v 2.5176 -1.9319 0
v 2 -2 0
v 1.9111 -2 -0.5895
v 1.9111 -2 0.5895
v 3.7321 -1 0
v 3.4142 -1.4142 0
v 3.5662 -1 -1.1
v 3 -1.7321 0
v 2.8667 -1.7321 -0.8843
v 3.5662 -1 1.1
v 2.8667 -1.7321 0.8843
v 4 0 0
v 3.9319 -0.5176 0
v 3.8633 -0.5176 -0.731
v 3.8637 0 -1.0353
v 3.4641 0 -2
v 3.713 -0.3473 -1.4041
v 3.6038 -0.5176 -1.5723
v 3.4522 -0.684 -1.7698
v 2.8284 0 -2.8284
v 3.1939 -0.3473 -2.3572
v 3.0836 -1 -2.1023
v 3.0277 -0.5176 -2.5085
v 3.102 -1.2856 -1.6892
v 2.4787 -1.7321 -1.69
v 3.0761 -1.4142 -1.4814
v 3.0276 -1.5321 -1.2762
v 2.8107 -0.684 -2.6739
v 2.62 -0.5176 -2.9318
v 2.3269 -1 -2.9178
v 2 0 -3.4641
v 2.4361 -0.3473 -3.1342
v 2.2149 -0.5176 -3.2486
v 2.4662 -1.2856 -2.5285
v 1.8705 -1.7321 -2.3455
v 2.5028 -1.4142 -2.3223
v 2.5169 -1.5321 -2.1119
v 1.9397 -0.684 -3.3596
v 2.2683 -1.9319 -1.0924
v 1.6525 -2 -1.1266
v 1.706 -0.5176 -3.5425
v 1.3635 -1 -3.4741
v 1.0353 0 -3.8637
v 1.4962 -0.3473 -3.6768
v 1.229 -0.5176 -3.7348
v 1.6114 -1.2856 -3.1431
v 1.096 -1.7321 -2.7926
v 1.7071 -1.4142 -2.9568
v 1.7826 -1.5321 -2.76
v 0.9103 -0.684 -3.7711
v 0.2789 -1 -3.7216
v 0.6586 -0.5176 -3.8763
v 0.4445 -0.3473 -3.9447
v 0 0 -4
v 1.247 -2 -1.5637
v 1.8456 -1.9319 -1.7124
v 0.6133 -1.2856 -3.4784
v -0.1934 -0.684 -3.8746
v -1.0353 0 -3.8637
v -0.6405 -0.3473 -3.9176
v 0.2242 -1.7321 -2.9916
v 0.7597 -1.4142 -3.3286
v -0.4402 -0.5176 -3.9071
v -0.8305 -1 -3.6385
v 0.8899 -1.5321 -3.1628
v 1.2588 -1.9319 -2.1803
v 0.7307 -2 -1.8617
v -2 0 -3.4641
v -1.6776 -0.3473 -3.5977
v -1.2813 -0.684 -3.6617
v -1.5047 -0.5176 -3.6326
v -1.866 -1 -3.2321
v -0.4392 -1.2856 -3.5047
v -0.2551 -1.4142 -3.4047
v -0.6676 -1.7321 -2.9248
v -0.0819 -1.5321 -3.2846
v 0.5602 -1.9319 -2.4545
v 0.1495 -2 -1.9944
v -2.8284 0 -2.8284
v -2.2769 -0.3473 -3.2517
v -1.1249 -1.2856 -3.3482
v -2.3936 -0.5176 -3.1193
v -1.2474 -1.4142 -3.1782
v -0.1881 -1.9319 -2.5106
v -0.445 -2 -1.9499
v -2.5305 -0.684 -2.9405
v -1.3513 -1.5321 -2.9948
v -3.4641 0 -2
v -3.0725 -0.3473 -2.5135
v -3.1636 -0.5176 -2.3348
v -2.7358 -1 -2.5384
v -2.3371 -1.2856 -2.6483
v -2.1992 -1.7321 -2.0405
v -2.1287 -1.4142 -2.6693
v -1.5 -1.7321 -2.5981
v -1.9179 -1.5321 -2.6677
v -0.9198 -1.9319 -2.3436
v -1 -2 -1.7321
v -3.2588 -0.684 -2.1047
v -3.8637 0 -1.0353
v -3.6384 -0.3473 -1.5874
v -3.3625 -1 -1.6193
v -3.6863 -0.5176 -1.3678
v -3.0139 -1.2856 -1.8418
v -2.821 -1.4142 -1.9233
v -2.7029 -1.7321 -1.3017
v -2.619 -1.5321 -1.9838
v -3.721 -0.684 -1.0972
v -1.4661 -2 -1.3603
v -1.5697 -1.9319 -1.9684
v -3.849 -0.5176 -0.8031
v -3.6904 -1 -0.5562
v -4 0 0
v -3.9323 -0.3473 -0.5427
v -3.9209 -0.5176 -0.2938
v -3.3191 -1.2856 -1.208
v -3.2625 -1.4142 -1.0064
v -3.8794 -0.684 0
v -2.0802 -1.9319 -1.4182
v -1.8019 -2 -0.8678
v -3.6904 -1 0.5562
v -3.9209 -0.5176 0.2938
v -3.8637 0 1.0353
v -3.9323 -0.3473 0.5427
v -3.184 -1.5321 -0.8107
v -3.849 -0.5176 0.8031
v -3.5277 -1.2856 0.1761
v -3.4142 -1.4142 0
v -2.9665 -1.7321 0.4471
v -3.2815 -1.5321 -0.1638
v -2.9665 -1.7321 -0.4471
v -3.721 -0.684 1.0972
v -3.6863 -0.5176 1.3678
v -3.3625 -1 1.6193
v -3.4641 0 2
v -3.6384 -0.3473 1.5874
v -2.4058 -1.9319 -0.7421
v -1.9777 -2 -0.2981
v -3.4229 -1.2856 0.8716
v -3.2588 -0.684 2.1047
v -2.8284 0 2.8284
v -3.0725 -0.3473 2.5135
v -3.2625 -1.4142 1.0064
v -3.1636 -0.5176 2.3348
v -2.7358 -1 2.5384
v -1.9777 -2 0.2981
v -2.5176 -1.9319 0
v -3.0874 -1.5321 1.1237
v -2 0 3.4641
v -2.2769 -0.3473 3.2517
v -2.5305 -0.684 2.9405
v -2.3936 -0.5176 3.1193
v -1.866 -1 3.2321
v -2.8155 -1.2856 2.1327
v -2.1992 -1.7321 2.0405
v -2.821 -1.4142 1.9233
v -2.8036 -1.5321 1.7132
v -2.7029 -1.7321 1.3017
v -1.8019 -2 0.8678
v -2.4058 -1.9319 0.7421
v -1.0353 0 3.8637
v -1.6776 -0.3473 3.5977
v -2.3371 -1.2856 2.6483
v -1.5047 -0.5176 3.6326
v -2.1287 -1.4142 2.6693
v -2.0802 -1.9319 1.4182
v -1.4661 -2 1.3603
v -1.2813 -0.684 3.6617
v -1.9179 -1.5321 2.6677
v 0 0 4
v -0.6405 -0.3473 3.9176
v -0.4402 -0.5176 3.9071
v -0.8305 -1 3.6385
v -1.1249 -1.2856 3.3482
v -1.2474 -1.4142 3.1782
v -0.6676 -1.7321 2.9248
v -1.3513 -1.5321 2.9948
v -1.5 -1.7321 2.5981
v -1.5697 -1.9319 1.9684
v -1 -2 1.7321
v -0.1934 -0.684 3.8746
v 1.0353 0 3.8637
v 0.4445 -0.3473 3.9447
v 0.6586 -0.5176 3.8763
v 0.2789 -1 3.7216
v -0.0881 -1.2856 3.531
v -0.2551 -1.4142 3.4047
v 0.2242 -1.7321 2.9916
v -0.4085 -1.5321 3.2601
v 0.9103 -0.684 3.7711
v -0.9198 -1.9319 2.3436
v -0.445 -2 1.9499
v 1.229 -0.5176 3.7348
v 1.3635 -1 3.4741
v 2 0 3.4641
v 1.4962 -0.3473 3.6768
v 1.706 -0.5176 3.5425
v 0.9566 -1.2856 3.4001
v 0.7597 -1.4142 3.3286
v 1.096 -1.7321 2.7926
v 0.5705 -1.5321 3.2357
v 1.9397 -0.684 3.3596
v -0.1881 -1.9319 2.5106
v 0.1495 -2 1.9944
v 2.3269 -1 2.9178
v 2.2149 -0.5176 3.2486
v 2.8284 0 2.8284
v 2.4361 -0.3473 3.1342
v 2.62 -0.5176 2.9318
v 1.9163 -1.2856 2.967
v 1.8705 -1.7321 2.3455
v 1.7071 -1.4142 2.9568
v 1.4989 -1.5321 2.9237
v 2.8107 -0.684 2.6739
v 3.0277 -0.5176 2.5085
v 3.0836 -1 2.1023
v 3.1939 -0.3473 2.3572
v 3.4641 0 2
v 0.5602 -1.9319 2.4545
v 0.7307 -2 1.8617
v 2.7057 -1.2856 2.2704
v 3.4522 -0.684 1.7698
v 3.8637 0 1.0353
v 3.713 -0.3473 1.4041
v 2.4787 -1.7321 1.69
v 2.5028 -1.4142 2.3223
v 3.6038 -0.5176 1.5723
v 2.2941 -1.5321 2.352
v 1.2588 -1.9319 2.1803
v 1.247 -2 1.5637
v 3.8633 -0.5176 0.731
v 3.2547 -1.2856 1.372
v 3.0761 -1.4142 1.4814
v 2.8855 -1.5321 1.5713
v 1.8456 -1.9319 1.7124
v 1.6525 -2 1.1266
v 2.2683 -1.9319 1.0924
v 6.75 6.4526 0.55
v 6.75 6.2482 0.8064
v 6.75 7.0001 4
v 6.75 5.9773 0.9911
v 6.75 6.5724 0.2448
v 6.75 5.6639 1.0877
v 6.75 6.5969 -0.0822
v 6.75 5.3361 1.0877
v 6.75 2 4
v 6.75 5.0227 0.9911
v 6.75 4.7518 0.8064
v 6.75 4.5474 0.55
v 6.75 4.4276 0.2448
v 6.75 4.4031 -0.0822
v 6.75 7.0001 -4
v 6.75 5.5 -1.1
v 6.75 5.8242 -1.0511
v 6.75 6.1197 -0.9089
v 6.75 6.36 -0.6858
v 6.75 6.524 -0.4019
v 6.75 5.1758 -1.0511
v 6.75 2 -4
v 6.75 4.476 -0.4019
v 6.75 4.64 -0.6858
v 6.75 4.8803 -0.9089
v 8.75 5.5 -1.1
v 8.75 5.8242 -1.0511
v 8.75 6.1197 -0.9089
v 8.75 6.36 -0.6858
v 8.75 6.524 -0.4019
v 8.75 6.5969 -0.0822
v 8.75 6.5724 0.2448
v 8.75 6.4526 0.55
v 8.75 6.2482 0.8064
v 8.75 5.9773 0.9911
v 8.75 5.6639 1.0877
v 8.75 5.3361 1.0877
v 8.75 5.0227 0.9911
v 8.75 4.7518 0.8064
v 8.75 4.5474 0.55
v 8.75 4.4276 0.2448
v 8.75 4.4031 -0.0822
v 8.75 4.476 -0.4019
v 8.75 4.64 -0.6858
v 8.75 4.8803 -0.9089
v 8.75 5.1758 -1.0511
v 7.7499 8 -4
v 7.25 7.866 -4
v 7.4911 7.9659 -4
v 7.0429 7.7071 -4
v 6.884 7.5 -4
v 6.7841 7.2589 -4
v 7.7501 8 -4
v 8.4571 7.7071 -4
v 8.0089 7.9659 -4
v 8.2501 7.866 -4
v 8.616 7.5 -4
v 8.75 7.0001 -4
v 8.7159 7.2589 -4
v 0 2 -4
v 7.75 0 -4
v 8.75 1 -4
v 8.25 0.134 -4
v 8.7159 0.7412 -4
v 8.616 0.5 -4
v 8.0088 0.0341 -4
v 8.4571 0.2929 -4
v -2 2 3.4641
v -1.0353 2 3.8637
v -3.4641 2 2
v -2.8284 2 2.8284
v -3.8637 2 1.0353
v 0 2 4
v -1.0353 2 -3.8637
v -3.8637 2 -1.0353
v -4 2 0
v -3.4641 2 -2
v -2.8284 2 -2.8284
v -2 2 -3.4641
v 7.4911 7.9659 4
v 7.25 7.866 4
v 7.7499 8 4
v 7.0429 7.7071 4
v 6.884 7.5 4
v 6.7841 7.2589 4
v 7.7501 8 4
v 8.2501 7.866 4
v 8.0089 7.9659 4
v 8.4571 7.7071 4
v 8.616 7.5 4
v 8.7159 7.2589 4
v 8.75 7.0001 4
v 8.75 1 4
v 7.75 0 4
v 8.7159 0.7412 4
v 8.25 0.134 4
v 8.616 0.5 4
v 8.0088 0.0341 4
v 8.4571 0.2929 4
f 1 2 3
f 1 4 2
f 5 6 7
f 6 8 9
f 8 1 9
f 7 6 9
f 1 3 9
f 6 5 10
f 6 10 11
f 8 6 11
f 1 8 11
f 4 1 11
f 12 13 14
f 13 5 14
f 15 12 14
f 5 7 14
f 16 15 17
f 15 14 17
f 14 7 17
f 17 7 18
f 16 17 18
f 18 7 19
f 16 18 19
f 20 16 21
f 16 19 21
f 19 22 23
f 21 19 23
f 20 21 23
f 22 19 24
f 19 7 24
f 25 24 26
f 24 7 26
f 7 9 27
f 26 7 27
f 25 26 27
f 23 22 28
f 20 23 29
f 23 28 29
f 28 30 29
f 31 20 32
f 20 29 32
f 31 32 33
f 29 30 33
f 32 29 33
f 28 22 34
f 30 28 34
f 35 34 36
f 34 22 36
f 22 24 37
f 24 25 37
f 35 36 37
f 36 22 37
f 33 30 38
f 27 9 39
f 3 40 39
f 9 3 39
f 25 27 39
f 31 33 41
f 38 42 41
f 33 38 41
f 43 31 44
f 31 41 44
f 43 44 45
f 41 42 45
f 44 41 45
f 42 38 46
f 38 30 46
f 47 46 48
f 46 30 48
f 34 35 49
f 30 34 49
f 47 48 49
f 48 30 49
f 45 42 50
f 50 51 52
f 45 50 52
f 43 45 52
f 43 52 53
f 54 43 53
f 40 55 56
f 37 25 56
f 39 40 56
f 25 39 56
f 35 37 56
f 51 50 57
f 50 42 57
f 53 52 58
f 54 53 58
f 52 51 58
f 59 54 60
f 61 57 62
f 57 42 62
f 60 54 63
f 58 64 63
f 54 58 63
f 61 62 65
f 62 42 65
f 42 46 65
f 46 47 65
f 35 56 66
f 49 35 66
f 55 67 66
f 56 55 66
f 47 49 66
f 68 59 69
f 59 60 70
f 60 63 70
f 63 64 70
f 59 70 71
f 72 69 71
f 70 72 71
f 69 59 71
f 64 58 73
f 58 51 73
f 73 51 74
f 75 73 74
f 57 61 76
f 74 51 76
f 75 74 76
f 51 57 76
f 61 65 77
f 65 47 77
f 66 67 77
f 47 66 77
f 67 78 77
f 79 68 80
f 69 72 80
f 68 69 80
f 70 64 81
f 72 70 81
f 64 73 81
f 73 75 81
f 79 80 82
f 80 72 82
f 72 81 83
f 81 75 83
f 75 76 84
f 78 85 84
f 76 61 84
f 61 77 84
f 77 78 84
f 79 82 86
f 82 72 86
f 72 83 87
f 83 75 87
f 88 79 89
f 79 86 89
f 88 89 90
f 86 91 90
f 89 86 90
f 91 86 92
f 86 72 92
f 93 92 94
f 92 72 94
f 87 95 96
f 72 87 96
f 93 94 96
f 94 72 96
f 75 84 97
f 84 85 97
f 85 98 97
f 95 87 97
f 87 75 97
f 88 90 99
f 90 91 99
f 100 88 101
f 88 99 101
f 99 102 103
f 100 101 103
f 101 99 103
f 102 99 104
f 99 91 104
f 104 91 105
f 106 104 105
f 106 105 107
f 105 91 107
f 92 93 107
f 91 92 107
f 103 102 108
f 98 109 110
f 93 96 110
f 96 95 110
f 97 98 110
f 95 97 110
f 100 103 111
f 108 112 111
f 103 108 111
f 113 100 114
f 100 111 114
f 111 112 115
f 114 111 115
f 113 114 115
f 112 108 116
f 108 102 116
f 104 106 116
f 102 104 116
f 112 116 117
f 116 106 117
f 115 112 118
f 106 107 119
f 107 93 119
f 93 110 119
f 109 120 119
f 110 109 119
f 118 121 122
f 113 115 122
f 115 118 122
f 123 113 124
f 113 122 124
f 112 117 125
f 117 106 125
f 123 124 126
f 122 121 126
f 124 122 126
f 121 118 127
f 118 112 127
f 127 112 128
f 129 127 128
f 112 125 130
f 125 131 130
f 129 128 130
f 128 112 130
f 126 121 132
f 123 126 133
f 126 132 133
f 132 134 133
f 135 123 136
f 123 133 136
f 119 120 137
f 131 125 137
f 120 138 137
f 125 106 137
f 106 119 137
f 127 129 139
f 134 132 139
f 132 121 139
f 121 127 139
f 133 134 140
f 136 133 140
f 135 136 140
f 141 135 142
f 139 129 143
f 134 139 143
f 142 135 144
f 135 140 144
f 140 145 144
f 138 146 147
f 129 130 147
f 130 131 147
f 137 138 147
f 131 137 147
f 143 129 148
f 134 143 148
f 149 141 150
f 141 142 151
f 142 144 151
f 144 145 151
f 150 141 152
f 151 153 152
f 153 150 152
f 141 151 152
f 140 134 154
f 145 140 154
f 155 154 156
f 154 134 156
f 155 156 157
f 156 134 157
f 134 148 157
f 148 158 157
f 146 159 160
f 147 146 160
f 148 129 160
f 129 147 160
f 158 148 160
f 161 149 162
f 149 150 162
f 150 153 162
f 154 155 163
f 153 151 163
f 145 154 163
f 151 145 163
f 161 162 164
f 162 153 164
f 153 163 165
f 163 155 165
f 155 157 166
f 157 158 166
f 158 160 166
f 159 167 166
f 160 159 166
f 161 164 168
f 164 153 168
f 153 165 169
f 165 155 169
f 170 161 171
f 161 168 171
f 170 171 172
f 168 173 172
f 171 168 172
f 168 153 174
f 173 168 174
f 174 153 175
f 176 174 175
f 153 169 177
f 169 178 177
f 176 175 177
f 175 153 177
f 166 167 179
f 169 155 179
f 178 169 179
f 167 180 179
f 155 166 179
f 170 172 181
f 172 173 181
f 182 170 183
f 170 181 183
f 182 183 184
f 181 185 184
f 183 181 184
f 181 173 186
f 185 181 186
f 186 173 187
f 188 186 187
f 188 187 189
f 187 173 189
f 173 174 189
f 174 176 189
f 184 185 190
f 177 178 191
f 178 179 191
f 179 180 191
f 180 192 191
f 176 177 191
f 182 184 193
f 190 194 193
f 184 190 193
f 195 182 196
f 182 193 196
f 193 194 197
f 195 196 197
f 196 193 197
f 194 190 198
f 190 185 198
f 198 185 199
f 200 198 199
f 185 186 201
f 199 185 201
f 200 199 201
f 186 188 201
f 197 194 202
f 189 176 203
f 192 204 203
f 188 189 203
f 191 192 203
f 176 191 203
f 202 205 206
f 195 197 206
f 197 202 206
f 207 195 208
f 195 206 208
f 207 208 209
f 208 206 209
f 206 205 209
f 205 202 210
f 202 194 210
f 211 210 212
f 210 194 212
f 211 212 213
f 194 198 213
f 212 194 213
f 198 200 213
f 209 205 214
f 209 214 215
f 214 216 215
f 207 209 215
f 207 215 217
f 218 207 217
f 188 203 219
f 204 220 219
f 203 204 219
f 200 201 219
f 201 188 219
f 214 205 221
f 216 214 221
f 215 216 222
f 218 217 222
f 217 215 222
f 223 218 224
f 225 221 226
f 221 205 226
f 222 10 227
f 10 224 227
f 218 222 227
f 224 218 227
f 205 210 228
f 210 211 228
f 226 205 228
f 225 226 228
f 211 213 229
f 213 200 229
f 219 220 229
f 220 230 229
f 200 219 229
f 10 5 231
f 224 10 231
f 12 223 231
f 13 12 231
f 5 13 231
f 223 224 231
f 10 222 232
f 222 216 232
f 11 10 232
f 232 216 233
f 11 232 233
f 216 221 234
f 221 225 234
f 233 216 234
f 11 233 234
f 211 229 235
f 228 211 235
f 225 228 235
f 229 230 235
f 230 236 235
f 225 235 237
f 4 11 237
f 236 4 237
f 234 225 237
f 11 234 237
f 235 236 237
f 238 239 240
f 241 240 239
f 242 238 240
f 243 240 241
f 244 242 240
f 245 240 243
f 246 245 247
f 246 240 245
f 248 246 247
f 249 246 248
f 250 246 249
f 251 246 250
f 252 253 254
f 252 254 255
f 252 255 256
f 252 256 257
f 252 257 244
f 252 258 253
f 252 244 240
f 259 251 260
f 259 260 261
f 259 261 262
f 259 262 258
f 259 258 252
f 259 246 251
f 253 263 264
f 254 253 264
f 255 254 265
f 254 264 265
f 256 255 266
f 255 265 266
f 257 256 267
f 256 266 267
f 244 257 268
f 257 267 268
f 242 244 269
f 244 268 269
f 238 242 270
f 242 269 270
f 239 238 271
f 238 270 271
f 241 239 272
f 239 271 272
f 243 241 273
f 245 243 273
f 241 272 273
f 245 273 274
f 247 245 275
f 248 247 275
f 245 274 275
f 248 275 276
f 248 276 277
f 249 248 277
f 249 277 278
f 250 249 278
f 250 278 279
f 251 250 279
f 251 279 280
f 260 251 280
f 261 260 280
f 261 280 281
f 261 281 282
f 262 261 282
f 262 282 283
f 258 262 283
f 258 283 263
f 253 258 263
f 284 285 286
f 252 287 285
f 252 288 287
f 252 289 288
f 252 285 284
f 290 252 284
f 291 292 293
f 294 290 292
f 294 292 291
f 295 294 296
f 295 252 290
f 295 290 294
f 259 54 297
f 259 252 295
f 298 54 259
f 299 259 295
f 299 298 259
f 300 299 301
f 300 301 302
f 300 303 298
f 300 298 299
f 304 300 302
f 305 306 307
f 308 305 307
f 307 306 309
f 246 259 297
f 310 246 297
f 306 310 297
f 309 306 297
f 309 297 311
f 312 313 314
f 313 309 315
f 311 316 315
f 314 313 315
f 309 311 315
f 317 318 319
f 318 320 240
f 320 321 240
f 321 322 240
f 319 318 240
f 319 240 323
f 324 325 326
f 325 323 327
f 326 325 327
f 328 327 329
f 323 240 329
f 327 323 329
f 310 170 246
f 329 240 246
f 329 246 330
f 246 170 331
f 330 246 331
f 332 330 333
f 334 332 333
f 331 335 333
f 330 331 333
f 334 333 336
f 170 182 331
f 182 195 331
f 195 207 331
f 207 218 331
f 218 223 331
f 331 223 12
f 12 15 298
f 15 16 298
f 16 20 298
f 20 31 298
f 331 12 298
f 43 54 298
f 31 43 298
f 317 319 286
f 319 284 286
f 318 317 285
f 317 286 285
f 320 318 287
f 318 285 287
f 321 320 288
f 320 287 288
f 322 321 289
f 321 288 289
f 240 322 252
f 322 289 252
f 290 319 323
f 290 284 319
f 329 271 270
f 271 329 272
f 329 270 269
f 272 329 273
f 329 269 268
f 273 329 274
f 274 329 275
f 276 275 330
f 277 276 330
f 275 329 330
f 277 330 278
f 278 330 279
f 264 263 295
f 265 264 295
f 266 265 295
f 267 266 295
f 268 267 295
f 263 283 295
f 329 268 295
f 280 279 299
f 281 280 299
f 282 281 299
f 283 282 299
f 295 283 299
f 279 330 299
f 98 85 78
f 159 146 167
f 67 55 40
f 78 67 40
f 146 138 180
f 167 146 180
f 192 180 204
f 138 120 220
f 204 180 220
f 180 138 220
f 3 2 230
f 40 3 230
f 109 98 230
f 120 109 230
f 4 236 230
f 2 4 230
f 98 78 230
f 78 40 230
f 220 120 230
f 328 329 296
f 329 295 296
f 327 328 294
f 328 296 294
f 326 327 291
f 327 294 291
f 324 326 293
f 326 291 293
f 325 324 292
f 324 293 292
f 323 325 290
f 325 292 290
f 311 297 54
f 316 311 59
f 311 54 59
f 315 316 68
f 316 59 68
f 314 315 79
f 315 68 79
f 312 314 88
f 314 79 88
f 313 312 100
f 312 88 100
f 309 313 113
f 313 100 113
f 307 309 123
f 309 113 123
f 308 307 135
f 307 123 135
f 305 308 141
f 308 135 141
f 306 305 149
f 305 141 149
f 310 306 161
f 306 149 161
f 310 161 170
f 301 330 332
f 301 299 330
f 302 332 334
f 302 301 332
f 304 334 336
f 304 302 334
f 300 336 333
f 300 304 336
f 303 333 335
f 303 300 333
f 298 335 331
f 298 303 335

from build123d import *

# Parameters (mm, degrees)
SKETCH_1_R          = 2.525
EXTRUDE_1_DEPTH     = 2
EXTRUDE_START       = -2
SKETCH_2_R          = 2.525
EXTRUDE_2_DEPTH     = 2
SKETCH_3_R          = 4
EXTRUDE_3_DEPTH     = 2
EXTRUDE_6_DEPTH     = 8
SKETCH_11_R         = 1.05
CUT_EXTRUDE_1_DEPTH = 28.51931143
FILLET_3_R          = 1
SKETCH_12_W         = 8
SKETCH_12_H         = 5.5
CUT_EXTRUDE_2_DEPTH = 17
SKETCH_13_W         = 2
SKETCH_13_H         = 8
EXTRUDE_7_DEPTH     = 6
FILLET_4_R          = 1
FILLET_5_R          = 1
SKETCH_14_R         = 1.1
CUT_EXTRUDE_3_DEPTH = 10


with BuildPart() as part:
    # 草图1 → 凸台-拉伸1 (new body)
    with BuildSketch(Plane(origin=(0, 0, 0), x_dir=(1, 0, 0), z_dir=(0, 1, 0))):
        with BuildLine():
            Line((0, 4), (25.75, 4))
            Line((25.75, 4), (25.75, -4))
            Line((25.75, -4), (0, -4))
            ThreePointArc((0, -4), (-4, 0), (0, 4))
        make_face()
        with Locations(Location((0, 0, 0), (0, 0, 270))):
            Circle(SKETCH_1_R, mode=Mode.SUBTRACT)
    extrude(amount=EXTRUDE_1_DEPTH)

    # 草图2 → 凸台-拉伸2 (add)
    with BuildSketch(Plane(origin=(0, 2, 0), x_dir=(1, 0, 0), z_dir=(0, 1, 0)).offset(EXTRUDE_START)):
        Circle(SKETCH_2_R)
    extrude(amount=EXTRUDE_2_DEPTH)

    # 草图3 → 凸台-拉伸3 (add)
    with BuildSketch(Plane(origin=(0, 0, 0), x_dir=(1, 0, 0), z_dir=(0, 1, 0)).offset(EXTRUDE_START)):
        with Locations(Location((0, 0, 0), (0, 0, 270))):
            Circle(SKETCH_3_R)
    extrude(amount=EXTRUDE_3_DEPTH)

    # 圆角2: read off the stored shape, not the designer's step
    # 圆角2 outline → 圆角2 (revolve, cut)
    with BuildSketch(Plane.XY):
        with BuildLine():
            ThreePointArc((4, 0), (3.414213562, -1.414213562), (2, -2))
            Line((2, -2), (4, -2))
            Line((4, -2), (4, 0))
        make_face()
    revolve(axis=Axis((0, 0, 0), (0, 1, 0)), mode=Mode.SUBTRACT)

    # 草图10 → 凸台-拉伸6 (add)
    with BuildSketch(Plane(origin=(0, 0, -4), x_dir=(-1, 0, 0), z_dir=(0, 0, -1))):
        with BuildLine():
            Line((-25.75, 2), (-25.75, 4))
            ThreePointArc((-25.75, 4), (-24.25, 5.5), (-22.75, 4))
            Line((-22.75, 4), (-22.75, 2))
            Line((-22.75, 2), (-25.75, 2))
        make_face()
        with BuildLine():
            Line((-18.75, 2), (-15.75, 2))
            Line((-15.75, 2), (-15.75, 4))
            ThreePointArc((-15.75, 4), (-17.25, 5.5), (-18.75, 4))
            Line((-18.75, 4), (-18.75, 2))
        make_face()
    extrude(amount=-EXTRUDE_6_DEPTH)

    # 草图11 → 切除-拉伸1 (cut, through all)
    with BuildSketch(Plane(origin=(0, 0, -4), x_dir=(-1, 0, 0), z_dir=(0, 0, -1))):
        with Locations((-17.25, 4)):
            Circle(SKETCH_11_R)
        with Locations((-24.25, 4)):
            Circle(SKETCH_11_R)
    extrude(amount=-CUT_EXTRUDE_1_DEPTH, mode=Mode.SUBTRACT)

    # 圆角3
    fillet_3_edges = [part.edges().sort_by_distance(p)[0] for p in [
        (25.75, 0, 0),
    ]]
    fillet(fillet_3_edges, radius=FILLET_3_R)

    # 草图12 → 切除-拉伸2 (cut)
    with BuildSketch(Plane(origin=(25.75, 0, 0), x_dir=(0, 0, -1), z_dir=(1, 0, 0))):
        with Locations((0, 2.75)):
            Rectangle(SKETCH_12_W, SKETCH_12_H)
    extrude(amount=-CUT_EXTRUDE_2_DEPTH, mode=Mode.SUBTRACT)

    # 草图13 → 凸台-拉伸7 (add)
    with BuildSketch(Plane(origin=(0, 2, 0), x_dir=(1, 0, 0), z_dir=(0, 1, 0))):
        with Locations((7.75, 0)):
            Rectangle(SKETCH_13_W, SKETCH_13_H)
    extrude(amount=EXTRUDE_7_DEPTH)

    # 圆角4
    fillet_4_edges = [part.edges().sort_by_distance(p)[0] for p in [
        (8.75, 0, 0),
    ]]
    fillet(fillet_4_edges, radius=FILLET_4_R)

    # 圆角5
    fillet_5_edges = [part.edges().sort_by_distance(p)[0] for p in [
        (6.75, 8, 0),
        (8.75, 8, 0),
    ]]
    fillet(fillet_5_edges, radius=FILLET_5_R - 0.0001)  # a hair under: the kernel refuses the full size

    # 草图14 → 切除-拉伸3 (cut)
    with BuildSketch(Plane(origin=(8.75, 0, 0), x_dir=(0, 0, -1), z_dir=(1, 0, 0))):
        with Locations((0, 5.5)):
            Circle(SKETCH_14_R)
    extrude(amount=-CUT_EXTRUDE_3_DEPTH, mode=Mode.SUBTRACT)


solid = part.part
